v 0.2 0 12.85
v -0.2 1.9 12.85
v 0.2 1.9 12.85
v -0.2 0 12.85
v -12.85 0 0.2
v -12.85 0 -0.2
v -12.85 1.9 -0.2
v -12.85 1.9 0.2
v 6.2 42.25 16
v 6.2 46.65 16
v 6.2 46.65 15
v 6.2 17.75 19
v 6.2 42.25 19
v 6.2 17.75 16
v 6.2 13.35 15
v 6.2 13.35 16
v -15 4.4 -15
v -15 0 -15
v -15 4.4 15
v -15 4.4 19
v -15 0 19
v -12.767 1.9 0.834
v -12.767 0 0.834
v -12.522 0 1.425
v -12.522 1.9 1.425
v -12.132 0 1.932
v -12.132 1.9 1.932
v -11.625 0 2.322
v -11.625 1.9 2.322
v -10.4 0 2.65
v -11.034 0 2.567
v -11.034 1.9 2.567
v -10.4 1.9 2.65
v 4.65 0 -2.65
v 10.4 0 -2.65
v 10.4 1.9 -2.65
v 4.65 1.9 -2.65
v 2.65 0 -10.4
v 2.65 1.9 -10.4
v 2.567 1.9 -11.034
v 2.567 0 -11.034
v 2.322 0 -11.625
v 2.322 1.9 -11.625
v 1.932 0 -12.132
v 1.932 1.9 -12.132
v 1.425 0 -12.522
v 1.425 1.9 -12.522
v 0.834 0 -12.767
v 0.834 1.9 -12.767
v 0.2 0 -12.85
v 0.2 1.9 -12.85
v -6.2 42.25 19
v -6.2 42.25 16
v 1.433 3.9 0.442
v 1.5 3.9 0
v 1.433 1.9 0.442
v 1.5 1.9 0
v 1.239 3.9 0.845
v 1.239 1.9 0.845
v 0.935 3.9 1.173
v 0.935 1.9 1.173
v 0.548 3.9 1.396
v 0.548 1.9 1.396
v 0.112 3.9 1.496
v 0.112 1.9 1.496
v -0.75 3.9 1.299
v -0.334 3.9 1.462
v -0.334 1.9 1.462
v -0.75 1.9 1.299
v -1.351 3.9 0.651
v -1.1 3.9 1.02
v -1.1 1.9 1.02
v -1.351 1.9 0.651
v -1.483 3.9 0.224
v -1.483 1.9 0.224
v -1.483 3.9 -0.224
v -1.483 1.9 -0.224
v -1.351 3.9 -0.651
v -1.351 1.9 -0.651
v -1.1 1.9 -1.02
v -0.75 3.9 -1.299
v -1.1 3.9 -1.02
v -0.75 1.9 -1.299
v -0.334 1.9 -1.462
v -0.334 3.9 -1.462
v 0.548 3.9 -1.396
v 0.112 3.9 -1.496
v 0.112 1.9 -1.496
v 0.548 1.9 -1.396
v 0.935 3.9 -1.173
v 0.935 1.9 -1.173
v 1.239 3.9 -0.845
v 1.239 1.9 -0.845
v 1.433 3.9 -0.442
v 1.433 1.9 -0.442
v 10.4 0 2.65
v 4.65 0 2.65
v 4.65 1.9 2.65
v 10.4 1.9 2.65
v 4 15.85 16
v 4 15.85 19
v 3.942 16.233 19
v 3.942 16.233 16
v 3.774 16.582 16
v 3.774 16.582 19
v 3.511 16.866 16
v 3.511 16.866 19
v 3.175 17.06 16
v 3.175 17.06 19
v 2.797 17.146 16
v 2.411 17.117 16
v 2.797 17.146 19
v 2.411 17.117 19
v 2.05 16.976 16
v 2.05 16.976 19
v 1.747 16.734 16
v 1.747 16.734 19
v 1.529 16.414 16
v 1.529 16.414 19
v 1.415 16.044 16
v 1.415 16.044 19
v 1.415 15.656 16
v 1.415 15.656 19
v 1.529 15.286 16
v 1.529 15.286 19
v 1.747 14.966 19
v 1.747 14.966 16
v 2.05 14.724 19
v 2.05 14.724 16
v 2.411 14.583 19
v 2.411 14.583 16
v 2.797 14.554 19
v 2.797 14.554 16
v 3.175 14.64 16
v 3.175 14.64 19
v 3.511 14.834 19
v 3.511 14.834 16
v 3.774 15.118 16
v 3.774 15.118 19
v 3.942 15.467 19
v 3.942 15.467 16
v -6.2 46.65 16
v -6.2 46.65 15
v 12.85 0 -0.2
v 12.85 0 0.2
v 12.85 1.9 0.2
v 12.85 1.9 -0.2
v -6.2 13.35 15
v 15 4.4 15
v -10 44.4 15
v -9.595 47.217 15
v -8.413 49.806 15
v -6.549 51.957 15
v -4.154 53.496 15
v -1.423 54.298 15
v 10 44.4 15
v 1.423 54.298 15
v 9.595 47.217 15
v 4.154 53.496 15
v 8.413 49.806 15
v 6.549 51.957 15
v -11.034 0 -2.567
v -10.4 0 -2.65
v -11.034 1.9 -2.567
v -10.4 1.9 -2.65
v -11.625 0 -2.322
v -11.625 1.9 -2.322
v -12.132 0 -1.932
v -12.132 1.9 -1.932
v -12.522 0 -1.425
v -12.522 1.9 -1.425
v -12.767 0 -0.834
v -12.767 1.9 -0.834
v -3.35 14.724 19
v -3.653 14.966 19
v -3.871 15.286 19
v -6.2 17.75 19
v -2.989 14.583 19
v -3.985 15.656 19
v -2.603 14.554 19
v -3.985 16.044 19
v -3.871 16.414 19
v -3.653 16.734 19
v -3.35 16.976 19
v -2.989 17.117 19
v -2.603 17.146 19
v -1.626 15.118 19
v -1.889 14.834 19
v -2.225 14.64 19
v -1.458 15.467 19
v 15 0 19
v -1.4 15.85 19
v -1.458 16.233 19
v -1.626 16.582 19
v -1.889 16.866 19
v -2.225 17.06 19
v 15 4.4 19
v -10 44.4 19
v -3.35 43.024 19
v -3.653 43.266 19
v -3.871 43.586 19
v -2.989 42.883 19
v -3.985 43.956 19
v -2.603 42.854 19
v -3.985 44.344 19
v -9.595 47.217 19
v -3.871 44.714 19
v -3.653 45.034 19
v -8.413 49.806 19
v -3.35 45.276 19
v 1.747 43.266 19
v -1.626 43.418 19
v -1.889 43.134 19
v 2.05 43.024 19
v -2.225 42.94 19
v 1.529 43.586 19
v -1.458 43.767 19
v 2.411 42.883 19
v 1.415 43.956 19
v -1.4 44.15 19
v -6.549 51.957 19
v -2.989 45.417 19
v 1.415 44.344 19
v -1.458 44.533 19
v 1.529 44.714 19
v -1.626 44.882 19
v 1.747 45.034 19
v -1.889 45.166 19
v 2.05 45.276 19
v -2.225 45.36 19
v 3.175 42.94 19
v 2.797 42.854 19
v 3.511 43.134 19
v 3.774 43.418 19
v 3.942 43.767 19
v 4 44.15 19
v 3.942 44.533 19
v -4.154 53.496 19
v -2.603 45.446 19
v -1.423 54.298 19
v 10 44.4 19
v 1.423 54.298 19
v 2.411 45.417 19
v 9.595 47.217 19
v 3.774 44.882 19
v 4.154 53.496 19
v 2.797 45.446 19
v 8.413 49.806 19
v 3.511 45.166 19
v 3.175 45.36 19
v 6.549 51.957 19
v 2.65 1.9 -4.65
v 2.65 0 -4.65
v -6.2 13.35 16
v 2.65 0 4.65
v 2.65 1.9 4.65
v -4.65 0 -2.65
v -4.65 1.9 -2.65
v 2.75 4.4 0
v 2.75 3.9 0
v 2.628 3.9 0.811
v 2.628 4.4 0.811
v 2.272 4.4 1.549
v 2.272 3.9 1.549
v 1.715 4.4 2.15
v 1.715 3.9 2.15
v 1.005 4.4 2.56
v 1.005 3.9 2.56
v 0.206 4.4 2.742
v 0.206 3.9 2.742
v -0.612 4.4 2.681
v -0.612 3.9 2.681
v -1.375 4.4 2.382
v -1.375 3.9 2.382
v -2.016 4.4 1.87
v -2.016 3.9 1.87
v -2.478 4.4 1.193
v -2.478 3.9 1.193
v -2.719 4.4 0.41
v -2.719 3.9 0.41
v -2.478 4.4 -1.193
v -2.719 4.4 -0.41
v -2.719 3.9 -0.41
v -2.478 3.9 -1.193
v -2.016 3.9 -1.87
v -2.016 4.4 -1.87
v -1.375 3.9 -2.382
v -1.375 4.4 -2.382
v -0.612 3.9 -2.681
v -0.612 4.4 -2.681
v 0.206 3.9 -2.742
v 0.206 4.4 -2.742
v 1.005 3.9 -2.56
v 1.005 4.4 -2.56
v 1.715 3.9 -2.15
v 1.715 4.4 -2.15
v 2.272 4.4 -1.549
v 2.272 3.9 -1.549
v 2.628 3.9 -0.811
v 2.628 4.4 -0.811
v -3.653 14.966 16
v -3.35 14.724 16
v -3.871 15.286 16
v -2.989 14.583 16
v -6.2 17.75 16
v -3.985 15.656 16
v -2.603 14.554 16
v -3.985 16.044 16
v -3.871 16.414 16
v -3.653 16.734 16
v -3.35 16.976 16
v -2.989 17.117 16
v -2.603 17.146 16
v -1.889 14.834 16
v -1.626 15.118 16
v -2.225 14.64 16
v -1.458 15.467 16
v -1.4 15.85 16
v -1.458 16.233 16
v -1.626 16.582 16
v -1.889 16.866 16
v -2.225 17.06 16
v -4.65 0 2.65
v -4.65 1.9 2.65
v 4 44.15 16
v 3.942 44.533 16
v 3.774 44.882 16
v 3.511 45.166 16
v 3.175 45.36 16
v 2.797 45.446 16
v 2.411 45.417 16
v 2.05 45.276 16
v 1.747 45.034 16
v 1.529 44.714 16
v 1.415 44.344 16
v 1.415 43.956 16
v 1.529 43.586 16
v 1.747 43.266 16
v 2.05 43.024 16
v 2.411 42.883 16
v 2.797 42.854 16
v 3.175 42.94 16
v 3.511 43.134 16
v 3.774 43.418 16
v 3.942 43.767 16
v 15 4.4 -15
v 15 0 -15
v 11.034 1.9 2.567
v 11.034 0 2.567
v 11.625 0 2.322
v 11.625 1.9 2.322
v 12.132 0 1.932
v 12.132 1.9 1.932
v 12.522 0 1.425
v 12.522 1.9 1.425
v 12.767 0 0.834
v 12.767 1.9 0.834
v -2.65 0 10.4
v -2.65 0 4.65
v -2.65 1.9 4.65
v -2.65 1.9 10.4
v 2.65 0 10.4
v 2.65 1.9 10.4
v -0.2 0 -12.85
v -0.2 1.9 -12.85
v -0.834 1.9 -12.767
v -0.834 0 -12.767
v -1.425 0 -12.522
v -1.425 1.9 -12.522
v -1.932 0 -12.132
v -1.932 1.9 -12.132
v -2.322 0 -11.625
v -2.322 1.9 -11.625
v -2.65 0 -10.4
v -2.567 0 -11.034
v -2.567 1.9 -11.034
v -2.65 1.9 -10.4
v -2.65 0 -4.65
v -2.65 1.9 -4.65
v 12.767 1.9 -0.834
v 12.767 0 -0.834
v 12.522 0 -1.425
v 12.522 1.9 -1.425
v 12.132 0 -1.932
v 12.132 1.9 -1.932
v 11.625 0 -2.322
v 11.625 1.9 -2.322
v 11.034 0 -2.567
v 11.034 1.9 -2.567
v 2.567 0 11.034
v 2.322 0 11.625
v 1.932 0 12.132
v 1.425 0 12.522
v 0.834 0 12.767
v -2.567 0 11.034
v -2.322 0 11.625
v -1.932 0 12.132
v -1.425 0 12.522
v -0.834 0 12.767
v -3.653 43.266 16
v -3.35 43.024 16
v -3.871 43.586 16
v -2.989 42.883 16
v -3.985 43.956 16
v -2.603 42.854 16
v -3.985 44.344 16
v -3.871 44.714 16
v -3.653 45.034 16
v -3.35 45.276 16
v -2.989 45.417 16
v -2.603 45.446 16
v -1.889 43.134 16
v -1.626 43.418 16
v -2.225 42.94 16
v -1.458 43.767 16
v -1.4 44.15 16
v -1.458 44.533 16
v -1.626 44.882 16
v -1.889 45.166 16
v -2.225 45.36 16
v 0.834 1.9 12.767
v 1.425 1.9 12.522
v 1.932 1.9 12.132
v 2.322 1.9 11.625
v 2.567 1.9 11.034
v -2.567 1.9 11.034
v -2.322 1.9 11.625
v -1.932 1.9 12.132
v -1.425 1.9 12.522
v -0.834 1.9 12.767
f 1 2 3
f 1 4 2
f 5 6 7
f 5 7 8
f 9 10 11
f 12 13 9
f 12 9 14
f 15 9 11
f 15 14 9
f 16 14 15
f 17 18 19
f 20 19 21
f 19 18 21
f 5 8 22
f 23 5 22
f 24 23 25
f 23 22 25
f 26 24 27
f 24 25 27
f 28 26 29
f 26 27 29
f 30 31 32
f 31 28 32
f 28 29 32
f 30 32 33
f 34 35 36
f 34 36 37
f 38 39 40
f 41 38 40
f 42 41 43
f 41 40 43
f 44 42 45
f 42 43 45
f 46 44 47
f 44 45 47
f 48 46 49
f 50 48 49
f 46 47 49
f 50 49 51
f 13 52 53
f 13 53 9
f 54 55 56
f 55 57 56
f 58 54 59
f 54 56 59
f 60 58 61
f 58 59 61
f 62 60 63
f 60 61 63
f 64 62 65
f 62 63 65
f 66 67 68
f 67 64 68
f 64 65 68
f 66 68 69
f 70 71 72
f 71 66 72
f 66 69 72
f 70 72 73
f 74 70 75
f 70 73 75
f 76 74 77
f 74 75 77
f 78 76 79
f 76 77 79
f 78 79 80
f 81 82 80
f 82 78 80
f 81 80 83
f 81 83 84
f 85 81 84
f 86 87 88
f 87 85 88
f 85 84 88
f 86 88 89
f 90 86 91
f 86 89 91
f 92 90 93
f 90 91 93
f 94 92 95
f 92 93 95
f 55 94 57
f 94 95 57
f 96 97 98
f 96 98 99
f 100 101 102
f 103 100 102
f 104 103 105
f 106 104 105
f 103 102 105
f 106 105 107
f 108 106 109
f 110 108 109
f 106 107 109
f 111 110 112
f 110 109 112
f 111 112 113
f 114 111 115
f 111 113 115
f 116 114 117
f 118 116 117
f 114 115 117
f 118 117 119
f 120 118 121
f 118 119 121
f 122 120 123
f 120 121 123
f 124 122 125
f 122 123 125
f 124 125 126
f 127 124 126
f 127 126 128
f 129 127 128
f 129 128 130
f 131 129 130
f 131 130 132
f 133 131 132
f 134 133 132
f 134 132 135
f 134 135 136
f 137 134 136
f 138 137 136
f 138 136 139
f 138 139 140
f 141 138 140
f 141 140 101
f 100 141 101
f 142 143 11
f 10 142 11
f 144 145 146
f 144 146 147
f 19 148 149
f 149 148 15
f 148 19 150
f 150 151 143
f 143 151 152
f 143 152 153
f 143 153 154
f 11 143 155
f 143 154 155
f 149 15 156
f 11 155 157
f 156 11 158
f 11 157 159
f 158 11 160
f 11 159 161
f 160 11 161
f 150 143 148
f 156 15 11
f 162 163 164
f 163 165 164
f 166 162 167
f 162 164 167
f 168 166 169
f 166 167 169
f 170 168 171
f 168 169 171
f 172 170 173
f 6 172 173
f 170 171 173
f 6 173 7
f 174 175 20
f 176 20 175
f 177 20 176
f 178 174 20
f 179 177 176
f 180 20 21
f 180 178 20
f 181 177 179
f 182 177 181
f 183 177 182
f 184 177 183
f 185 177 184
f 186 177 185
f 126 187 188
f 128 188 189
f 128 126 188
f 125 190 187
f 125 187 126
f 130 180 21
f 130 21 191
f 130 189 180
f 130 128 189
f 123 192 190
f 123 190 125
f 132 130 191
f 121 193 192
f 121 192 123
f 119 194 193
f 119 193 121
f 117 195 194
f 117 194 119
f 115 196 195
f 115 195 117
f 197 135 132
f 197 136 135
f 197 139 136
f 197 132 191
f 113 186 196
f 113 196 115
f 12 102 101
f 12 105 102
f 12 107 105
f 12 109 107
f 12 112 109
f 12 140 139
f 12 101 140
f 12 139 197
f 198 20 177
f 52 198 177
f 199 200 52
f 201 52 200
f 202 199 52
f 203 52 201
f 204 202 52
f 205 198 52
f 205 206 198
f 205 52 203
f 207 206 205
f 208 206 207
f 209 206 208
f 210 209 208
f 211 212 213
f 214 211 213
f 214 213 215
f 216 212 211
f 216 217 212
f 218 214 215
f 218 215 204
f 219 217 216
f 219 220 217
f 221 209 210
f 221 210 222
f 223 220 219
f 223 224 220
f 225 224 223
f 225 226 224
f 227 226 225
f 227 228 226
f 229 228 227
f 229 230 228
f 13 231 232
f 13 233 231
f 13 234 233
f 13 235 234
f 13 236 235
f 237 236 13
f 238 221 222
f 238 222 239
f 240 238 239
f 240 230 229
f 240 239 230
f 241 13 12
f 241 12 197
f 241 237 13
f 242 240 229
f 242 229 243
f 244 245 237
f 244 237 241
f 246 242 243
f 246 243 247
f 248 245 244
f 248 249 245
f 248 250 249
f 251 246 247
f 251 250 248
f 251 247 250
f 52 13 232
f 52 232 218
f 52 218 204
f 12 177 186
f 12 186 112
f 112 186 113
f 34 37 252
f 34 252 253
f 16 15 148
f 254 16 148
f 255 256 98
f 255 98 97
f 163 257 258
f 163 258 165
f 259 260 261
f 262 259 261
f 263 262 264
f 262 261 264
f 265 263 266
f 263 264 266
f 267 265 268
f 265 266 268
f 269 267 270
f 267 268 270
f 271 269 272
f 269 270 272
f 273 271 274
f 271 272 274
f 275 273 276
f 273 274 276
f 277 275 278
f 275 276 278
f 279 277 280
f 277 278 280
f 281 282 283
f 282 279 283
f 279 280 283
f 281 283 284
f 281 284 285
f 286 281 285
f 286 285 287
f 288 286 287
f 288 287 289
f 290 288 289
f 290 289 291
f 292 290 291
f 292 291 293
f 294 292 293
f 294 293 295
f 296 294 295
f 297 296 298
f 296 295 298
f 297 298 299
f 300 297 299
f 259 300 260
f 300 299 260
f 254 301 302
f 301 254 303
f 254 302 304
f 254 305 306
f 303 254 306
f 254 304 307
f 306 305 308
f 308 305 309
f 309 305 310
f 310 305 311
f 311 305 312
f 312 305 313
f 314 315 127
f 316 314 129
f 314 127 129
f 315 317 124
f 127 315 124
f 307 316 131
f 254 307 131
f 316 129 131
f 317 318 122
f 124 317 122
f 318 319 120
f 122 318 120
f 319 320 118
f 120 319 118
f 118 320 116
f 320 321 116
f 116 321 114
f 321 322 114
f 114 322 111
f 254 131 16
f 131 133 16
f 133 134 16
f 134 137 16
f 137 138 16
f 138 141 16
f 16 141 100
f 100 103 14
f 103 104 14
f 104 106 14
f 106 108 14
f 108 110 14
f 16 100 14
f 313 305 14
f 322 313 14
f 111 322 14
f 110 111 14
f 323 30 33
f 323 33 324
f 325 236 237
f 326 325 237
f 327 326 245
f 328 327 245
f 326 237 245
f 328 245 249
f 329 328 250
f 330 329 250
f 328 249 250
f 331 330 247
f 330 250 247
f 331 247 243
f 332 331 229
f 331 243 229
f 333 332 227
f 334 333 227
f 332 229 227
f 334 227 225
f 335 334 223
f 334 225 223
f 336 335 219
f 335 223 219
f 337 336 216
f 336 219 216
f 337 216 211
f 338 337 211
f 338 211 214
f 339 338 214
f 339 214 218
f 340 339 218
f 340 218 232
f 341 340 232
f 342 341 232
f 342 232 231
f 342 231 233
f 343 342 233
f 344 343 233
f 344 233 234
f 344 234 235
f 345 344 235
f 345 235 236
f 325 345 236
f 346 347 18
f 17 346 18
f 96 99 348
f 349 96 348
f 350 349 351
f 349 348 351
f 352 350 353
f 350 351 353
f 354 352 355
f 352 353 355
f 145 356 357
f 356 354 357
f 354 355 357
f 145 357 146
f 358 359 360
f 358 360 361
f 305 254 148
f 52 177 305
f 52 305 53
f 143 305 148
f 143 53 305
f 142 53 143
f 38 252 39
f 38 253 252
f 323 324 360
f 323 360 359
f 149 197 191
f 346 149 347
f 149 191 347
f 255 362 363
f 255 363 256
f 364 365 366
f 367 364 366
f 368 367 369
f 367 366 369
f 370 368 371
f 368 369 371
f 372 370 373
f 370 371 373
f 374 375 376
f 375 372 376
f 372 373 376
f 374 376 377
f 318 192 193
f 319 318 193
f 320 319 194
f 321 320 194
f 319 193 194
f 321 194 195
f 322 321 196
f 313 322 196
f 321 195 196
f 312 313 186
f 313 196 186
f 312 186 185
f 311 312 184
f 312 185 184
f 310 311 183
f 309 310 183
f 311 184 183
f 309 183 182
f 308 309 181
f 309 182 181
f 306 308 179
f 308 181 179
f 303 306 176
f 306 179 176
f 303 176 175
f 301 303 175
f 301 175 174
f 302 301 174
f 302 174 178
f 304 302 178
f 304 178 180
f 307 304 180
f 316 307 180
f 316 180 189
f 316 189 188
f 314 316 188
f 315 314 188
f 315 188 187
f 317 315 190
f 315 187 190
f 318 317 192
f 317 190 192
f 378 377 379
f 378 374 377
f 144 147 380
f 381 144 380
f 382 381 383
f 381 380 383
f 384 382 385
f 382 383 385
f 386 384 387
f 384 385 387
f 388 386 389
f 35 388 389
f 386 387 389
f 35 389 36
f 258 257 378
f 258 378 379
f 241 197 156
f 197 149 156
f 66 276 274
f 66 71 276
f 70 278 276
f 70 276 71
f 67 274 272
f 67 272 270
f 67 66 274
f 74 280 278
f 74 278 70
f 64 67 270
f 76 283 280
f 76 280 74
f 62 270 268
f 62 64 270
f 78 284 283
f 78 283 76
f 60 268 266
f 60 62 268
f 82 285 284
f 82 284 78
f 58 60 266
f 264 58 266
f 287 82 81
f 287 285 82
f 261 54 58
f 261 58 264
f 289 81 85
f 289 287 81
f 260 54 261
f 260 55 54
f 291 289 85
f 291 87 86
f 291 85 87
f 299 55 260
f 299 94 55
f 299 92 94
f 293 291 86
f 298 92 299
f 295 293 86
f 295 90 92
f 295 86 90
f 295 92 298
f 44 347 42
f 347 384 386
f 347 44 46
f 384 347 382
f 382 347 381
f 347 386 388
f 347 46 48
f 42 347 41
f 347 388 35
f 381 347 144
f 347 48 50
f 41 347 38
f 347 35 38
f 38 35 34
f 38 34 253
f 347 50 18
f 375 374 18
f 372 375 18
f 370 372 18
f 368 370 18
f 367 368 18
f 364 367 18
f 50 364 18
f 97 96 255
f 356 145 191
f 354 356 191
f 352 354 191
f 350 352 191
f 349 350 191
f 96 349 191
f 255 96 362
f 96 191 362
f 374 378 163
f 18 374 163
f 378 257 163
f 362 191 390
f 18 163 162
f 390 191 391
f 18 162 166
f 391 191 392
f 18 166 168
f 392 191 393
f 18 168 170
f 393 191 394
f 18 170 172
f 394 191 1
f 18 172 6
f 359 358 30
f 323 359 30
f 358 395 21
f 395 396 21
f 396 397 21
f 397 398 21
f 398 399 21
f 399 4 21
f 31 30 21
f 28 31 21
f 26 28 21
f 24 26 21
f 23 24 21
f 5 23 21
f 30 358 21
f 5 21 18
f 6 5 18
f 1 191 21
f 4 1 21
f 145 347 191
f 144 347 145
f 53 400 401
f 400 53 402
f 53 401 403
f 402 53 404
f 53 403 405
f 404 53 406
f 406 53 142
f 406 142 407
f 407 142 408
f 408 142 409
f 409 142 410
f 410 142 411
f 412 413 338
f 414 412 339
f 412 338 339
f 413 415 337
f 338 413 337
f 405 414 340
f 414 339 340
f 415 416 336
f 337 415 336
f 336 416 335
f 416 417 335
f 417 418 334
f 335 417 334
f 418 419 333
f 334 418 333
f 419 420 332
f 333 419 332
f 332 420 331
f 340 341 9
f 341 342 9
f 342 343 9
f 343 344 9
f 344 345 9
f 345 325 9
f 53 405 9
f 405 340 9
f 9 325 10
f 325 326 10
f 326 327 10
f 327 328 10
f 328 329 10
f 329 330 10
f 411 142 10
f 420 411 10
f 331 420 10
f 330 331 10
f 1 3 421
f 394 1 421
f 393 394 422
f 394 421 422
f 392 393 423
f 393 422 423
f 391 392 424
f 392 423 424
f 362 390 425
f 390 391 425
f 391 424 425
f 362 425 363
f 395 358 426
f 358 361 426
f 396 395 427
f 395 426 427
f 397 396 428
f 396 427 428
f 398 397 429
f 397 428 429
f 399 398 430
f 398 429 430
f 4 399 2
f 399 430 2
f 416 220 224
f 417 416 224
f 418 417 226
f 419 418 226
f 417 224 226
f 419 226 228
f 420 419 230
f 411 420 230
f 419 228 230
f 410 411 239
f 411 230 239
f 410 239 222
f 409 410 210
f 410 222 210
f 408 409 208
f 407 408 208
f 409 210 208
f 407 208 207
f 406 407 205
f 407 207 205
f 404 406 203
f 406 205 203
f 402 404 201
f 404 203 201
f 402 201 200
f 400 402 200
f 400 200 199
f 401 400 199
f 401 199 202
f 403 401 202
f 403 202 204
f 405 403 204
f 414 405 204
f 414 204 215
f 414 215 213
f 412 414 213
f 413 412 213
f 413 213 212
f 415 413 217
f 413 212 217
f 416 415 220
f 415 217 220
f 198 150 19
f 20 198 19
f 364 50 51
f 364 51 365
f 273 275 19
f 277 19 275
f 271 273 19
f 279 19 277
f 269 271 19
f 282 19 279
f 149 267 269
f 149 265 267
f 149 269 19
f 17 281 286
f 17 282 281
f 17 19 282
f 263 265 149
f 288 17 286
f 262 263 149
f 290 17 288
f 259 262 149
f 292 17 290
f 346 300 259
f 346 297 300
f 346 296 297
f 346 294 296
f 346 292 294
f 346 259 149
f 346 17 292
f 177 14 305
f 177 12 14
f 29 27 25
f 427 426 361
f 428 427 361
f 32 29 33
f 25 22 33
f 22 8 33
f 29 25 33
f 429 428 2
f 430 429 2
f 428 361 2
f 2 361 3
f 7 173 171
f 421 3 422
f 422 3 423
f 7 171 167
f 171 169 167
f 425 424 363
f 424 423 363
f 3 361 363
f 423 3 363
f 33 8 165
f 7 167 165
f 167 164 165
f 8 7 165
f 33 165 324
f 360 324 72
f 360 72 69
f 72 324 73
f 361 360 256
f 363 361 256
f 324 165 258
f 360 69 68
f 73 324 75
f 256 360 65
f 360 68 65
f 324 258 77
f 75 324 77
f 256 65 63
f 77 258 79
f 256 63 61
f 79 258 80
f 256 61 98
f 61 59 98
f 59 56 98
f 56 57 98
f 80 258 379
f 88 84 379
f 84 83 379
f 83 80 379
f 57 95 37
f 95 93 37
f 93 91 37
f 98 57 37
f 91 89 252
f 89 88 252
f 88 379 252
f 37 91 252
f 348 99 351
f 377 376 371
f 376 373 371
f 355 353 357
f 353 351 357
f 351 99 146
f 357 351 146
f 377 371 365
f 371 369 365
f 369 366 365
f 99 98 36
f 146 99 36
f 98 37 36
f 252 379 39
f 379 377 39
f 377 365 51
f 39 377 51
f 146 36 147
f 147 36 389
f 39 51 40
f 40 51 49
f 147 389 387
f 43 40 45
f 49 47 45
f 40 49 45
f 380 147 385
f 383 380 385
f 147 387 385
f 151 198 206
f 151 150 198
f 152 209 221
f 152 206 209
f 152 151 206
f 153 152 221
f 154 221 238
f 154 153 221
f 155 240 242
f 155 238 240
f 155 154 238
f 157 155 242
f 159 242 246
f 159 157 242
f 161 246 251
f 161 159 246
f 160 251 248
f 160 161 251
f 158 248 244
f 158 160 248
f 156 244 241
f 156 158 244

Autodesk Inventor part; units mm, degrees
ref_plane "YZ Plane" through (0, 0, 0) normal (1, 0, 0) x (0, 1, 0)
ref_plane "XZ Plane" through (0, 0, 0) normal (0, 1, 0) x (-1, 0, 0)
sketch "Sketch1" plane through (0, 0, 0) normal (0, 1, 0) x (-1, 0, 0)
  line L0 (-15, -15) -> (15, -15)
  line L1 (15, -15) -> (15, 15)
  line L2 (15, 15) -> (-15, 15)
  line L3 (-15, 15) -> (-15, -15)
  line L4 (-15, -15) -> (15, 15) construction
  line L5 (15, -15) -> (-15, 15) construction
  line L6 (-2.45, -12.65) -> (2.45, -12.65) construction
  line L7 (2.45, -12.65) -> (2.45, 12.65) construction
  line L8 (2.45, 12.65) -> (-2.45, 12.65) construction
  line L9 (-2.45, 12.65) -> (-2.45, -12.65) construction
  line L10 (-2.45, -12.65) -> (2.45, 12.65) construction
  line L11 (2.45, -12.65) -> (-2.45, 12.65) construction
  line L12 (-12.65, -2.45) -> (12.65, -2.45) construction
  line L13 (12.65, -2.45) -> (12.65, 2.45) construction
  line L14 (12.65, 2.45) -> (-12.65, 2.45) construction
  line L15 (-12.65, 2.45) -> (-12.65, -2.45) construction
  line L16 (-12.65, -2.45) -> (12.65, 2.45) construction
  line L17 (12.65, -2.45) -> (-12.65, 2.45) construction
  line L18 (-12.85, -2.65) -> (12.85, -2.65)
  line L19 (12.85, -2.65) -> (12.85, 2.65)
  line L20 (12.85, 2.65) -> (-12.85, 2.65)
  line L21 (-12.85, 2.65) -> (-12.85, -2.65)
  line L22 (-12.85, -2.65) -> (12.85, 2.65) construction
  line L23 (12.85, -2.65) -> (-12.85, 2.65) construction
  line L24 (-2.65, -12.85) -> (2.65, -12.85)
  line L25 (2.65, -12.85) -> (2.65, 12.85)
  line L26 (2.65, 12.85) -> (-2.65, 12.85)
  line L27 (-2.65, 12.85) -> (-2.65, -12.85)
  line L28 (-2.65, -12.85) -> (2.65, 12.85) construction
  line L29 (2.65, -12.85) -> (-2.65, 12.85) construction
  point P0 (0, 0)
  point P1 (0, 0)
  dimension "d0" = 30
  dimension "d1" = 4.9
  dimension "d2" = 10.2
  dimension "d3" = 0.2
  dimension "d4" = 0.2
extrude "Extrusion1" add sketch "Sketch1" along normal blind 1.9
sketch "Sketch2" plane through (0, 1.9, 0) normal (0, 1, 0) x (1, 0, 0)
  line L0 (15, 15) -> (-15, 15) projected
  line L1 (-15, 15) -> (-15, -15) projected
  line L2 (-15, -15) -> (15, -15) projected
  line L3 (15, -15) -> (15, 15) projected
  circle A0 centre (0, 0) radius 1.5
  dimension "d7" = 3
extrude "Extrusion2" add sketch "Sketch2" along normal blind 2
sketch "Sketch3" plane through (0, 3.9, 0) normal (0, 1, 0) x (1, 0, 0)
  circle A0 centre (0, 0) radius 1.5 projected
  line L0 (15, 15) -> (-15, 15) projected
  line L1 (-15, 15) -> (-15, -15) projected
  line L2 (-15, -15) -> (15, -15) projected
  line L3 (15, -15) -> (15, 15) projected
  circle A1 centre (0, 0) radius 2.75
  dimension "d10" = 5.5
extrude "Extrusion3" add sketch "Sketch3" along normal blind 0.5 contours L3 L2 L1 L0
chamfer "Chamfer1" distance 2 angle 45 1 edges at (-2.65, 0.95, -2.65)
fillet "Fillet1" radius 2.45 1 edges at (-12.85, 0.95, -2.65)
fillet "Fillet2" radius 2.45 1 edges at (-2.65, 0.95, -12.85)
chamfer "Chamfer2" distance 2 angle 45 1 edges at (2.65, 0.95, -2.65)
chamfer "Chamfer3" distance 2 angle 45 1 edges at (2.65, 0.95, 2.65)
fillet "Fillet3" radius 2.45 1 edges at (12.85, 0.95, -2.65)
fillet "Fillet4" radius 2.45 1 edges at (2.65, 0.95, -12.85)
fillet "Fillet5" radius 2.45 1 edges at (12.85, 0.95, 2.65)
fillet "Fillet6" radius 2.45 1 edges at (2.65, 0.95, 12.85)
chamfer "Chamfer4" distance 2 angle 45 1 edges at (-2.65, 0.95, 2.65)
fillet "Fillet7" radius 2.45 2 edges at (-2.65, 0.95, 12.85) (-12.85, 0.95, 2.65)
sketch "Sketch8" plane through (-15, 0, 15) normal (0, 0, 1) x (1, 0, 0)
  line L0 (0, 0) -> (30, 0) projected
  line L1 (30, 0) -> (30, 4.4) projected
  line L2 (0, 4.4) -> (30, 4.4) projected
  line L3 (0, 0) -> (0, 4.4) projected
  line L4 (15, 0) -> (15, 120) construction
  line L5 (30, 4.4) -> (25, 44.4)
  line L6 (25, 44.4) -> (5, 44.4)
  line L7 (5, 44.4) -> (0, 4.4)
  arc A0 (25, 44.4) -> (5, 44.4) centre (15, 44.4) ccw
  dimension "d101" = 40
  dimension "d102" = 20
extrude "Extrusion7" add sketch "Sketch8" along normal blind 4
sketch "Sketch9" plane through (-15, 0, 19) normal (0, 0, 1) x (1, 0, 0)
  line L0 (0, 0) -> (30, 0) projected
  line L1 (9.3, 41.75) -> (20.7, 41.75) construction
  line L2 (20.7, 41.75) -> (20.7, 18.25) construction
  line L3 (20.7, 18.25) -> (9.3, 18.25) construction
  line L4 (9.3, 18.25) -> (9.3, 41.75) construction
  line L5 (15, 90) -> (15, 15.8225) construction
  line L6 (9.3, 41.75) -> (9.3, 46.15) construction
  line L7 (9.3, 46.15) -> (20.7, 46.15) construction
  line L8 (20.7, 46.15) -> (20.7, 41.75) construction
  line L9 (20.7, 18.25) -> (20.7, 13.85) construction
  line L10 (20.7, 13.85) -> (9.3, 13.85) construction
  line L11 (9.3, 13.85) -> (9.3, 18.25) construction
  circle A0 centre (12.3, 44.15) radius 1.3
  circle A1 centre (17.7, 44.15) radius 1.3
  line L12 (-17.4512, 30) -> (18.2205, 30) construction
  circle A2 centre (12.3, 15.85) radius 1.3
  circle A3 centre (17.7, 15.85) radius 1.3
  line L13 (8.8, 42.25) -> (21.2, 42.25)
  line L14 (21.2, 42.25) -> (21.2, 17.75)
  line L15 (21.2, 17.75) -> (8.8, 17.75)
  line L16 (8.8, 17.75) -> (8.8, 42.25)
  line L17 (15, 0) -> (15, 83.8502) construction
  dimension "d105" = 11.4
  dimension "d106" = 23.5
  dimension "d107" = 3
  dimension "d108" = 2.4
  dimension "d109" = 4.4
  dimension "d110" = 0.5
  dimension "d111" = 0.5
  dimension "d113" = 2.6
  dimension "d122" = 30
extrude "Extrusion8" cut sketch "Sketch9" against normal through all
sketch "Sketch10" plane through (-15, 0, 19) normal (0, 0, 1) x (1, 0, 0)
  circle A0 centre (17.7, 15.85) radius 1.3 projected
  circle A1 centre (17.7, 44.15) radius 1.3 projected
  circle A2 centre (12.3, 44.15) radius 1.3 projected
  circle A3 centre (12.3, 15.85) radius 1.3 projected
  line L0 (8.8, 17.75) -> (8.8, 42.25) projected
  line L1 (8.8, 42.25) -> (21.2, 42.25) projected
  line L2 (21.2, 42.25) -> (21.2, 17.75) projected
  line L3 (21.2, 17.75) -> (8.8, 17.75) projected
  line L4 (0, 0) -> (30, 0) projected
  line L5 (9.3, 41.75) -> (20.7, 41.75) construction
  line L6 (20.7, 41.75) -> (20.7, 18.25) construction
  line L7 (20.7, 18.25) -> (9.3, 18.25) construction
  line L8 (9.3, 18.25) -> (9.3, 41.75) construction
  line L9 (15, 87.388) -> (15, -76.2197) construction
  line L10 (9.3, 41.75) -> (9.3, 46.15) construction
  line L11 (9.3, 46.15) -> (20.7, 46.15) construction
  line L12 (20.7, 46.15) -> (20.7, 41.75) construction
  line L13 (20.7, 18.25) -> (20.7, 13.85) construction
  line L14 (20.7, 13.85) -> (9.3, 13.85) construction
  line L15 (9.3, 13.85) -> (9.3, 18.25) construction
  line L16 (0.832, 30) -> (29.7617, 30) construction
  line L17 (8.8, 46.65) -> (21.2, 46.65)
  line L18 (21.2, 46.65) -> (21.2, 13.35)
  line L19 (21.2, 13.35) -> (8.8, 13.35)
  line L20 (8.8, 13.35) -> (8.8, 46.65)
  line L21 (15, 0) -> (15, 87.4766) construction
  dimension "d125" = 11.4
  dimension "d126" = 23.5
  dimension "d127" = 4.4
  dimension "d128" = 0.5
  dimension "d130" = 0.5
  dimension "d136" = 30
ref_plane "Work Plane2" through (-15, 0, 16) normal (0, 0, 1) x (1, 0, 0)
extrude "Extrusion10" cut sketch "Sketch10" along normal up to surface (1 mm away) from surface at -4 contours L3 L18 L19 L20 | L20 L17 L18 L1
equation "\"d0\" = FrontUpperLegShoulderWidth"
equation "\"d1\" = ServoArmWidth"
equation "\"d2\" = ServoArmLength"
equation "\"d3\" = ServoArmSpacing"
equation "\"d4\" = ServoArmSpacing"
equation "\"d5\" = ServoArmThickness"
equation "\"d7\" = ServoArmHoleRequired"
equation "\"d8\" = MinimalThickness"
equation "\"d10\" = ServoArmHeadScrewTrace"
equation "\"d11\" = ServoArmHeadScrewThickness"
equation "\"d13\" = ServoArmInternFillet"
equation "\"d16\" = ServoArmExternFillet"
equation "\"d17\" = ServoArmExternFillet"
equation "\"d18\" = ServoArmInternFillet"
equation "\"d21\" = ServoArmInternFillet"
equation "\"d24\" = ServoArmExternFillet"
equation "\"d25\" = ServoArmExternFillet"
equation "\"d26\" = ServoArmExternFillet"
equation "\"d27\" = ServoArmExternFillet"
equation "\"d28\" = ServoArmInternFillet"
equation "\"d31\" = ServoArmExternFillet"
equation "\"d101\" = FrontShoulderHeight"
equation "\"d102\" = FrontShoulderWidth"
equation "\"d103\" = FrontShoulderThickness"
equation "\"d105\" = ServoCoreWidth"
equation "\"d106\" = ServoCoreLength"
equation "\"d107\" = ServoEdgeToFixation"
equation "\"d108\" = ServoCoreToFixation"
equation "\"d109\" = ServoFixationLength"
equation "\"d110\" = ServoTraceSpacing"
equation "\"d111\" = ServoTraceSpacing"
equation "\"d113\" = ServoScrewDiameterRequired"
equation "\"d122\" = FrontShoulderServoCenterDistance"
equation "\"d123\" = FrontShoulderThickness"
equation "\"d125\" = ServoCoreWidth"
equation "\"d126\" = ServoCoreLength"
equation "\"d127\" = ServoFixationLength"
equation "\"d128\" = ServoTraceSpacing"
equation "\"d130\" = ServoTraceSpacing"
equation "\"d136\" = FrontShoulderServoCenterDistance"
equation "\"ServoTraceSpacing\" = 0.5"
equation "\"FrontUpperLegShoulderWidth\" = 30"
equation "\"LegServoThickness\" = 3"
equation "\"FrontShoulderHeight\" = 40"
equation "\"FrontShoulderWidth\" = 20"
equation "\"FrontShoulderThickness\" = 4"
equation "\"FrontShoulderServoCenterDistance\" = 30"
equation "\"d140\" = -LegServoThickness"
equation "\"ServoArmWidth\" = 4.9"
equation "\"ServoArmLength\" = 10.2"
equation "\"ServoArmSpacing\" = 0.2"
equation "\"ServoArmThickness\" = 1.9"
equation "\"ServoArmHoleRequired\" = 3"
equation "\"MinimalThickness\" = 2"
equation "\"ServoArmHeadScrewTrace\" = 5.5"
equation "\"ServoArmHeadScrewThickness\" = 0.5"
equation "\"ServoArmInternFillet\" = 2"
equation "\"ServoArmExternFillet\" = 2.45"
equation "\"ServoCoreWidth\" = 11.4"
equation "\"ServoCoreLength\" = 23.5"
equation "\"ServoEdgeToFixation\" = 3"
equation "\"ServoCoreToFixation\" = 2.4"
equation "\"ServoFixationLength\" = 4.4"
equation "\"ServoScrewDiameterRequired\" = 2.6"
properties part number "BackUpperLegShoulder" material "PC/ABS Plastic"
